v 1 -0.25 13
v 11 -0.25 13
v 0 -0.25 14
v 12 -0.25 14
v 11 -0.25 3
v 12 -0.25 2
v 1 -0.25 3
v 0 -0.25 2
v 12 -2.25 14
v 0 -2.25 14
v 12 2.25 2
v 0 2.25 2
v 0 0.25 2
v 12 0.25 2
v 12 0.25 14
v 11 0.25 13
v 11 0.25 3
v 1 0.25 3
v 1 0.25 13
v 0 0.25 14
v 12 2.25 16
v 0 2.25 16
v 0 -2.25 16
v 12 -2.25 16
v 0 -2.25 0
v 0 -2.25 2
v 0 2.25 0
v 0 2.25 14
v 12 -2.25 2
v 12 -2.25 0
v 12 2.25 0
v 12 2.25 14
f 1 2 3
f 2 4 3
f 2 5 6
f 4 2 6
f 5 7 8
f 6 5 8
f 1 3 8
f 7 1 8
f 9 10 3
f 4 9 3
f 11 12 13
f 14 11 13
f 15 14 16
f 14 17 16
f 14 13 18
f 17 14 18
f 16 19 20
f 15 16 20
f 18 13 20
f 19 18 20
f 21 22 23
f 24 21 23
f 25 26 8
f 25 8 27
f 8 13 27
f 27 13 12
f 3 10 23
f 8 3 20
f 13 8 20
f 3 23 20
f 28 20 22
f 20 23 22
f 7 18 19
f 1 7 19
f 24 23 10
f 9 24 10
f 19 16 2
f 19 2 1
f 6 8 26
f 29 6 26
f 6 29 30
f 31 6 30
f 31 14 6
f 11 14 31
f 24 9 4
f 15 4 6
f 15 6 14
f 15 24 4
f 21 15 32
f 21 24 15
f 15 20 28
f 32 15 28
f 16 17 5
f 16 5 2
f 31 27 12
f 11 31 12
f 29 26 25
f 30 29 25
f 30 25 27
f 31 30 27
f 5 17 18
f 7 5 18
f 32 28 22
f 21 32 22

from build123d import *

# Parameters (mm, degrees)
F1_DEPTH = 12
F2_W     = 10
F2_H     = 10
F3_DEPTH = 0.5


with BuildPart() as f1:
    # F0 (on Right) → F1 (new body)
    with BuildSketch(Plane.YZ):
        Polygon((2.25, 16), (-2.25, 16), (-2.25, 14), (-0.25, 14), (-0.25, 2), (-2.25, 2), (-2.25, 0), (2.25, 0), (2.25, 2), (0.25, 2), (0.25, 14), (2.25, 14), align=None)
    extrude(amount=F1_DEPTH)

    # F2 (on face) → F3 (cut, through all)
    with BuildSketch(Plane(origin=(0, 0.25, 0), x_dir=(-1, 0, 0), z_dir=(0, 1, 0))):
        with Locations((-6, 8)):
            Rectangle(F2_W, F2_H)
    extrude(amount=-F3_DEPTH, mode=Mode.SUBTRACT)


solid = f1.part
